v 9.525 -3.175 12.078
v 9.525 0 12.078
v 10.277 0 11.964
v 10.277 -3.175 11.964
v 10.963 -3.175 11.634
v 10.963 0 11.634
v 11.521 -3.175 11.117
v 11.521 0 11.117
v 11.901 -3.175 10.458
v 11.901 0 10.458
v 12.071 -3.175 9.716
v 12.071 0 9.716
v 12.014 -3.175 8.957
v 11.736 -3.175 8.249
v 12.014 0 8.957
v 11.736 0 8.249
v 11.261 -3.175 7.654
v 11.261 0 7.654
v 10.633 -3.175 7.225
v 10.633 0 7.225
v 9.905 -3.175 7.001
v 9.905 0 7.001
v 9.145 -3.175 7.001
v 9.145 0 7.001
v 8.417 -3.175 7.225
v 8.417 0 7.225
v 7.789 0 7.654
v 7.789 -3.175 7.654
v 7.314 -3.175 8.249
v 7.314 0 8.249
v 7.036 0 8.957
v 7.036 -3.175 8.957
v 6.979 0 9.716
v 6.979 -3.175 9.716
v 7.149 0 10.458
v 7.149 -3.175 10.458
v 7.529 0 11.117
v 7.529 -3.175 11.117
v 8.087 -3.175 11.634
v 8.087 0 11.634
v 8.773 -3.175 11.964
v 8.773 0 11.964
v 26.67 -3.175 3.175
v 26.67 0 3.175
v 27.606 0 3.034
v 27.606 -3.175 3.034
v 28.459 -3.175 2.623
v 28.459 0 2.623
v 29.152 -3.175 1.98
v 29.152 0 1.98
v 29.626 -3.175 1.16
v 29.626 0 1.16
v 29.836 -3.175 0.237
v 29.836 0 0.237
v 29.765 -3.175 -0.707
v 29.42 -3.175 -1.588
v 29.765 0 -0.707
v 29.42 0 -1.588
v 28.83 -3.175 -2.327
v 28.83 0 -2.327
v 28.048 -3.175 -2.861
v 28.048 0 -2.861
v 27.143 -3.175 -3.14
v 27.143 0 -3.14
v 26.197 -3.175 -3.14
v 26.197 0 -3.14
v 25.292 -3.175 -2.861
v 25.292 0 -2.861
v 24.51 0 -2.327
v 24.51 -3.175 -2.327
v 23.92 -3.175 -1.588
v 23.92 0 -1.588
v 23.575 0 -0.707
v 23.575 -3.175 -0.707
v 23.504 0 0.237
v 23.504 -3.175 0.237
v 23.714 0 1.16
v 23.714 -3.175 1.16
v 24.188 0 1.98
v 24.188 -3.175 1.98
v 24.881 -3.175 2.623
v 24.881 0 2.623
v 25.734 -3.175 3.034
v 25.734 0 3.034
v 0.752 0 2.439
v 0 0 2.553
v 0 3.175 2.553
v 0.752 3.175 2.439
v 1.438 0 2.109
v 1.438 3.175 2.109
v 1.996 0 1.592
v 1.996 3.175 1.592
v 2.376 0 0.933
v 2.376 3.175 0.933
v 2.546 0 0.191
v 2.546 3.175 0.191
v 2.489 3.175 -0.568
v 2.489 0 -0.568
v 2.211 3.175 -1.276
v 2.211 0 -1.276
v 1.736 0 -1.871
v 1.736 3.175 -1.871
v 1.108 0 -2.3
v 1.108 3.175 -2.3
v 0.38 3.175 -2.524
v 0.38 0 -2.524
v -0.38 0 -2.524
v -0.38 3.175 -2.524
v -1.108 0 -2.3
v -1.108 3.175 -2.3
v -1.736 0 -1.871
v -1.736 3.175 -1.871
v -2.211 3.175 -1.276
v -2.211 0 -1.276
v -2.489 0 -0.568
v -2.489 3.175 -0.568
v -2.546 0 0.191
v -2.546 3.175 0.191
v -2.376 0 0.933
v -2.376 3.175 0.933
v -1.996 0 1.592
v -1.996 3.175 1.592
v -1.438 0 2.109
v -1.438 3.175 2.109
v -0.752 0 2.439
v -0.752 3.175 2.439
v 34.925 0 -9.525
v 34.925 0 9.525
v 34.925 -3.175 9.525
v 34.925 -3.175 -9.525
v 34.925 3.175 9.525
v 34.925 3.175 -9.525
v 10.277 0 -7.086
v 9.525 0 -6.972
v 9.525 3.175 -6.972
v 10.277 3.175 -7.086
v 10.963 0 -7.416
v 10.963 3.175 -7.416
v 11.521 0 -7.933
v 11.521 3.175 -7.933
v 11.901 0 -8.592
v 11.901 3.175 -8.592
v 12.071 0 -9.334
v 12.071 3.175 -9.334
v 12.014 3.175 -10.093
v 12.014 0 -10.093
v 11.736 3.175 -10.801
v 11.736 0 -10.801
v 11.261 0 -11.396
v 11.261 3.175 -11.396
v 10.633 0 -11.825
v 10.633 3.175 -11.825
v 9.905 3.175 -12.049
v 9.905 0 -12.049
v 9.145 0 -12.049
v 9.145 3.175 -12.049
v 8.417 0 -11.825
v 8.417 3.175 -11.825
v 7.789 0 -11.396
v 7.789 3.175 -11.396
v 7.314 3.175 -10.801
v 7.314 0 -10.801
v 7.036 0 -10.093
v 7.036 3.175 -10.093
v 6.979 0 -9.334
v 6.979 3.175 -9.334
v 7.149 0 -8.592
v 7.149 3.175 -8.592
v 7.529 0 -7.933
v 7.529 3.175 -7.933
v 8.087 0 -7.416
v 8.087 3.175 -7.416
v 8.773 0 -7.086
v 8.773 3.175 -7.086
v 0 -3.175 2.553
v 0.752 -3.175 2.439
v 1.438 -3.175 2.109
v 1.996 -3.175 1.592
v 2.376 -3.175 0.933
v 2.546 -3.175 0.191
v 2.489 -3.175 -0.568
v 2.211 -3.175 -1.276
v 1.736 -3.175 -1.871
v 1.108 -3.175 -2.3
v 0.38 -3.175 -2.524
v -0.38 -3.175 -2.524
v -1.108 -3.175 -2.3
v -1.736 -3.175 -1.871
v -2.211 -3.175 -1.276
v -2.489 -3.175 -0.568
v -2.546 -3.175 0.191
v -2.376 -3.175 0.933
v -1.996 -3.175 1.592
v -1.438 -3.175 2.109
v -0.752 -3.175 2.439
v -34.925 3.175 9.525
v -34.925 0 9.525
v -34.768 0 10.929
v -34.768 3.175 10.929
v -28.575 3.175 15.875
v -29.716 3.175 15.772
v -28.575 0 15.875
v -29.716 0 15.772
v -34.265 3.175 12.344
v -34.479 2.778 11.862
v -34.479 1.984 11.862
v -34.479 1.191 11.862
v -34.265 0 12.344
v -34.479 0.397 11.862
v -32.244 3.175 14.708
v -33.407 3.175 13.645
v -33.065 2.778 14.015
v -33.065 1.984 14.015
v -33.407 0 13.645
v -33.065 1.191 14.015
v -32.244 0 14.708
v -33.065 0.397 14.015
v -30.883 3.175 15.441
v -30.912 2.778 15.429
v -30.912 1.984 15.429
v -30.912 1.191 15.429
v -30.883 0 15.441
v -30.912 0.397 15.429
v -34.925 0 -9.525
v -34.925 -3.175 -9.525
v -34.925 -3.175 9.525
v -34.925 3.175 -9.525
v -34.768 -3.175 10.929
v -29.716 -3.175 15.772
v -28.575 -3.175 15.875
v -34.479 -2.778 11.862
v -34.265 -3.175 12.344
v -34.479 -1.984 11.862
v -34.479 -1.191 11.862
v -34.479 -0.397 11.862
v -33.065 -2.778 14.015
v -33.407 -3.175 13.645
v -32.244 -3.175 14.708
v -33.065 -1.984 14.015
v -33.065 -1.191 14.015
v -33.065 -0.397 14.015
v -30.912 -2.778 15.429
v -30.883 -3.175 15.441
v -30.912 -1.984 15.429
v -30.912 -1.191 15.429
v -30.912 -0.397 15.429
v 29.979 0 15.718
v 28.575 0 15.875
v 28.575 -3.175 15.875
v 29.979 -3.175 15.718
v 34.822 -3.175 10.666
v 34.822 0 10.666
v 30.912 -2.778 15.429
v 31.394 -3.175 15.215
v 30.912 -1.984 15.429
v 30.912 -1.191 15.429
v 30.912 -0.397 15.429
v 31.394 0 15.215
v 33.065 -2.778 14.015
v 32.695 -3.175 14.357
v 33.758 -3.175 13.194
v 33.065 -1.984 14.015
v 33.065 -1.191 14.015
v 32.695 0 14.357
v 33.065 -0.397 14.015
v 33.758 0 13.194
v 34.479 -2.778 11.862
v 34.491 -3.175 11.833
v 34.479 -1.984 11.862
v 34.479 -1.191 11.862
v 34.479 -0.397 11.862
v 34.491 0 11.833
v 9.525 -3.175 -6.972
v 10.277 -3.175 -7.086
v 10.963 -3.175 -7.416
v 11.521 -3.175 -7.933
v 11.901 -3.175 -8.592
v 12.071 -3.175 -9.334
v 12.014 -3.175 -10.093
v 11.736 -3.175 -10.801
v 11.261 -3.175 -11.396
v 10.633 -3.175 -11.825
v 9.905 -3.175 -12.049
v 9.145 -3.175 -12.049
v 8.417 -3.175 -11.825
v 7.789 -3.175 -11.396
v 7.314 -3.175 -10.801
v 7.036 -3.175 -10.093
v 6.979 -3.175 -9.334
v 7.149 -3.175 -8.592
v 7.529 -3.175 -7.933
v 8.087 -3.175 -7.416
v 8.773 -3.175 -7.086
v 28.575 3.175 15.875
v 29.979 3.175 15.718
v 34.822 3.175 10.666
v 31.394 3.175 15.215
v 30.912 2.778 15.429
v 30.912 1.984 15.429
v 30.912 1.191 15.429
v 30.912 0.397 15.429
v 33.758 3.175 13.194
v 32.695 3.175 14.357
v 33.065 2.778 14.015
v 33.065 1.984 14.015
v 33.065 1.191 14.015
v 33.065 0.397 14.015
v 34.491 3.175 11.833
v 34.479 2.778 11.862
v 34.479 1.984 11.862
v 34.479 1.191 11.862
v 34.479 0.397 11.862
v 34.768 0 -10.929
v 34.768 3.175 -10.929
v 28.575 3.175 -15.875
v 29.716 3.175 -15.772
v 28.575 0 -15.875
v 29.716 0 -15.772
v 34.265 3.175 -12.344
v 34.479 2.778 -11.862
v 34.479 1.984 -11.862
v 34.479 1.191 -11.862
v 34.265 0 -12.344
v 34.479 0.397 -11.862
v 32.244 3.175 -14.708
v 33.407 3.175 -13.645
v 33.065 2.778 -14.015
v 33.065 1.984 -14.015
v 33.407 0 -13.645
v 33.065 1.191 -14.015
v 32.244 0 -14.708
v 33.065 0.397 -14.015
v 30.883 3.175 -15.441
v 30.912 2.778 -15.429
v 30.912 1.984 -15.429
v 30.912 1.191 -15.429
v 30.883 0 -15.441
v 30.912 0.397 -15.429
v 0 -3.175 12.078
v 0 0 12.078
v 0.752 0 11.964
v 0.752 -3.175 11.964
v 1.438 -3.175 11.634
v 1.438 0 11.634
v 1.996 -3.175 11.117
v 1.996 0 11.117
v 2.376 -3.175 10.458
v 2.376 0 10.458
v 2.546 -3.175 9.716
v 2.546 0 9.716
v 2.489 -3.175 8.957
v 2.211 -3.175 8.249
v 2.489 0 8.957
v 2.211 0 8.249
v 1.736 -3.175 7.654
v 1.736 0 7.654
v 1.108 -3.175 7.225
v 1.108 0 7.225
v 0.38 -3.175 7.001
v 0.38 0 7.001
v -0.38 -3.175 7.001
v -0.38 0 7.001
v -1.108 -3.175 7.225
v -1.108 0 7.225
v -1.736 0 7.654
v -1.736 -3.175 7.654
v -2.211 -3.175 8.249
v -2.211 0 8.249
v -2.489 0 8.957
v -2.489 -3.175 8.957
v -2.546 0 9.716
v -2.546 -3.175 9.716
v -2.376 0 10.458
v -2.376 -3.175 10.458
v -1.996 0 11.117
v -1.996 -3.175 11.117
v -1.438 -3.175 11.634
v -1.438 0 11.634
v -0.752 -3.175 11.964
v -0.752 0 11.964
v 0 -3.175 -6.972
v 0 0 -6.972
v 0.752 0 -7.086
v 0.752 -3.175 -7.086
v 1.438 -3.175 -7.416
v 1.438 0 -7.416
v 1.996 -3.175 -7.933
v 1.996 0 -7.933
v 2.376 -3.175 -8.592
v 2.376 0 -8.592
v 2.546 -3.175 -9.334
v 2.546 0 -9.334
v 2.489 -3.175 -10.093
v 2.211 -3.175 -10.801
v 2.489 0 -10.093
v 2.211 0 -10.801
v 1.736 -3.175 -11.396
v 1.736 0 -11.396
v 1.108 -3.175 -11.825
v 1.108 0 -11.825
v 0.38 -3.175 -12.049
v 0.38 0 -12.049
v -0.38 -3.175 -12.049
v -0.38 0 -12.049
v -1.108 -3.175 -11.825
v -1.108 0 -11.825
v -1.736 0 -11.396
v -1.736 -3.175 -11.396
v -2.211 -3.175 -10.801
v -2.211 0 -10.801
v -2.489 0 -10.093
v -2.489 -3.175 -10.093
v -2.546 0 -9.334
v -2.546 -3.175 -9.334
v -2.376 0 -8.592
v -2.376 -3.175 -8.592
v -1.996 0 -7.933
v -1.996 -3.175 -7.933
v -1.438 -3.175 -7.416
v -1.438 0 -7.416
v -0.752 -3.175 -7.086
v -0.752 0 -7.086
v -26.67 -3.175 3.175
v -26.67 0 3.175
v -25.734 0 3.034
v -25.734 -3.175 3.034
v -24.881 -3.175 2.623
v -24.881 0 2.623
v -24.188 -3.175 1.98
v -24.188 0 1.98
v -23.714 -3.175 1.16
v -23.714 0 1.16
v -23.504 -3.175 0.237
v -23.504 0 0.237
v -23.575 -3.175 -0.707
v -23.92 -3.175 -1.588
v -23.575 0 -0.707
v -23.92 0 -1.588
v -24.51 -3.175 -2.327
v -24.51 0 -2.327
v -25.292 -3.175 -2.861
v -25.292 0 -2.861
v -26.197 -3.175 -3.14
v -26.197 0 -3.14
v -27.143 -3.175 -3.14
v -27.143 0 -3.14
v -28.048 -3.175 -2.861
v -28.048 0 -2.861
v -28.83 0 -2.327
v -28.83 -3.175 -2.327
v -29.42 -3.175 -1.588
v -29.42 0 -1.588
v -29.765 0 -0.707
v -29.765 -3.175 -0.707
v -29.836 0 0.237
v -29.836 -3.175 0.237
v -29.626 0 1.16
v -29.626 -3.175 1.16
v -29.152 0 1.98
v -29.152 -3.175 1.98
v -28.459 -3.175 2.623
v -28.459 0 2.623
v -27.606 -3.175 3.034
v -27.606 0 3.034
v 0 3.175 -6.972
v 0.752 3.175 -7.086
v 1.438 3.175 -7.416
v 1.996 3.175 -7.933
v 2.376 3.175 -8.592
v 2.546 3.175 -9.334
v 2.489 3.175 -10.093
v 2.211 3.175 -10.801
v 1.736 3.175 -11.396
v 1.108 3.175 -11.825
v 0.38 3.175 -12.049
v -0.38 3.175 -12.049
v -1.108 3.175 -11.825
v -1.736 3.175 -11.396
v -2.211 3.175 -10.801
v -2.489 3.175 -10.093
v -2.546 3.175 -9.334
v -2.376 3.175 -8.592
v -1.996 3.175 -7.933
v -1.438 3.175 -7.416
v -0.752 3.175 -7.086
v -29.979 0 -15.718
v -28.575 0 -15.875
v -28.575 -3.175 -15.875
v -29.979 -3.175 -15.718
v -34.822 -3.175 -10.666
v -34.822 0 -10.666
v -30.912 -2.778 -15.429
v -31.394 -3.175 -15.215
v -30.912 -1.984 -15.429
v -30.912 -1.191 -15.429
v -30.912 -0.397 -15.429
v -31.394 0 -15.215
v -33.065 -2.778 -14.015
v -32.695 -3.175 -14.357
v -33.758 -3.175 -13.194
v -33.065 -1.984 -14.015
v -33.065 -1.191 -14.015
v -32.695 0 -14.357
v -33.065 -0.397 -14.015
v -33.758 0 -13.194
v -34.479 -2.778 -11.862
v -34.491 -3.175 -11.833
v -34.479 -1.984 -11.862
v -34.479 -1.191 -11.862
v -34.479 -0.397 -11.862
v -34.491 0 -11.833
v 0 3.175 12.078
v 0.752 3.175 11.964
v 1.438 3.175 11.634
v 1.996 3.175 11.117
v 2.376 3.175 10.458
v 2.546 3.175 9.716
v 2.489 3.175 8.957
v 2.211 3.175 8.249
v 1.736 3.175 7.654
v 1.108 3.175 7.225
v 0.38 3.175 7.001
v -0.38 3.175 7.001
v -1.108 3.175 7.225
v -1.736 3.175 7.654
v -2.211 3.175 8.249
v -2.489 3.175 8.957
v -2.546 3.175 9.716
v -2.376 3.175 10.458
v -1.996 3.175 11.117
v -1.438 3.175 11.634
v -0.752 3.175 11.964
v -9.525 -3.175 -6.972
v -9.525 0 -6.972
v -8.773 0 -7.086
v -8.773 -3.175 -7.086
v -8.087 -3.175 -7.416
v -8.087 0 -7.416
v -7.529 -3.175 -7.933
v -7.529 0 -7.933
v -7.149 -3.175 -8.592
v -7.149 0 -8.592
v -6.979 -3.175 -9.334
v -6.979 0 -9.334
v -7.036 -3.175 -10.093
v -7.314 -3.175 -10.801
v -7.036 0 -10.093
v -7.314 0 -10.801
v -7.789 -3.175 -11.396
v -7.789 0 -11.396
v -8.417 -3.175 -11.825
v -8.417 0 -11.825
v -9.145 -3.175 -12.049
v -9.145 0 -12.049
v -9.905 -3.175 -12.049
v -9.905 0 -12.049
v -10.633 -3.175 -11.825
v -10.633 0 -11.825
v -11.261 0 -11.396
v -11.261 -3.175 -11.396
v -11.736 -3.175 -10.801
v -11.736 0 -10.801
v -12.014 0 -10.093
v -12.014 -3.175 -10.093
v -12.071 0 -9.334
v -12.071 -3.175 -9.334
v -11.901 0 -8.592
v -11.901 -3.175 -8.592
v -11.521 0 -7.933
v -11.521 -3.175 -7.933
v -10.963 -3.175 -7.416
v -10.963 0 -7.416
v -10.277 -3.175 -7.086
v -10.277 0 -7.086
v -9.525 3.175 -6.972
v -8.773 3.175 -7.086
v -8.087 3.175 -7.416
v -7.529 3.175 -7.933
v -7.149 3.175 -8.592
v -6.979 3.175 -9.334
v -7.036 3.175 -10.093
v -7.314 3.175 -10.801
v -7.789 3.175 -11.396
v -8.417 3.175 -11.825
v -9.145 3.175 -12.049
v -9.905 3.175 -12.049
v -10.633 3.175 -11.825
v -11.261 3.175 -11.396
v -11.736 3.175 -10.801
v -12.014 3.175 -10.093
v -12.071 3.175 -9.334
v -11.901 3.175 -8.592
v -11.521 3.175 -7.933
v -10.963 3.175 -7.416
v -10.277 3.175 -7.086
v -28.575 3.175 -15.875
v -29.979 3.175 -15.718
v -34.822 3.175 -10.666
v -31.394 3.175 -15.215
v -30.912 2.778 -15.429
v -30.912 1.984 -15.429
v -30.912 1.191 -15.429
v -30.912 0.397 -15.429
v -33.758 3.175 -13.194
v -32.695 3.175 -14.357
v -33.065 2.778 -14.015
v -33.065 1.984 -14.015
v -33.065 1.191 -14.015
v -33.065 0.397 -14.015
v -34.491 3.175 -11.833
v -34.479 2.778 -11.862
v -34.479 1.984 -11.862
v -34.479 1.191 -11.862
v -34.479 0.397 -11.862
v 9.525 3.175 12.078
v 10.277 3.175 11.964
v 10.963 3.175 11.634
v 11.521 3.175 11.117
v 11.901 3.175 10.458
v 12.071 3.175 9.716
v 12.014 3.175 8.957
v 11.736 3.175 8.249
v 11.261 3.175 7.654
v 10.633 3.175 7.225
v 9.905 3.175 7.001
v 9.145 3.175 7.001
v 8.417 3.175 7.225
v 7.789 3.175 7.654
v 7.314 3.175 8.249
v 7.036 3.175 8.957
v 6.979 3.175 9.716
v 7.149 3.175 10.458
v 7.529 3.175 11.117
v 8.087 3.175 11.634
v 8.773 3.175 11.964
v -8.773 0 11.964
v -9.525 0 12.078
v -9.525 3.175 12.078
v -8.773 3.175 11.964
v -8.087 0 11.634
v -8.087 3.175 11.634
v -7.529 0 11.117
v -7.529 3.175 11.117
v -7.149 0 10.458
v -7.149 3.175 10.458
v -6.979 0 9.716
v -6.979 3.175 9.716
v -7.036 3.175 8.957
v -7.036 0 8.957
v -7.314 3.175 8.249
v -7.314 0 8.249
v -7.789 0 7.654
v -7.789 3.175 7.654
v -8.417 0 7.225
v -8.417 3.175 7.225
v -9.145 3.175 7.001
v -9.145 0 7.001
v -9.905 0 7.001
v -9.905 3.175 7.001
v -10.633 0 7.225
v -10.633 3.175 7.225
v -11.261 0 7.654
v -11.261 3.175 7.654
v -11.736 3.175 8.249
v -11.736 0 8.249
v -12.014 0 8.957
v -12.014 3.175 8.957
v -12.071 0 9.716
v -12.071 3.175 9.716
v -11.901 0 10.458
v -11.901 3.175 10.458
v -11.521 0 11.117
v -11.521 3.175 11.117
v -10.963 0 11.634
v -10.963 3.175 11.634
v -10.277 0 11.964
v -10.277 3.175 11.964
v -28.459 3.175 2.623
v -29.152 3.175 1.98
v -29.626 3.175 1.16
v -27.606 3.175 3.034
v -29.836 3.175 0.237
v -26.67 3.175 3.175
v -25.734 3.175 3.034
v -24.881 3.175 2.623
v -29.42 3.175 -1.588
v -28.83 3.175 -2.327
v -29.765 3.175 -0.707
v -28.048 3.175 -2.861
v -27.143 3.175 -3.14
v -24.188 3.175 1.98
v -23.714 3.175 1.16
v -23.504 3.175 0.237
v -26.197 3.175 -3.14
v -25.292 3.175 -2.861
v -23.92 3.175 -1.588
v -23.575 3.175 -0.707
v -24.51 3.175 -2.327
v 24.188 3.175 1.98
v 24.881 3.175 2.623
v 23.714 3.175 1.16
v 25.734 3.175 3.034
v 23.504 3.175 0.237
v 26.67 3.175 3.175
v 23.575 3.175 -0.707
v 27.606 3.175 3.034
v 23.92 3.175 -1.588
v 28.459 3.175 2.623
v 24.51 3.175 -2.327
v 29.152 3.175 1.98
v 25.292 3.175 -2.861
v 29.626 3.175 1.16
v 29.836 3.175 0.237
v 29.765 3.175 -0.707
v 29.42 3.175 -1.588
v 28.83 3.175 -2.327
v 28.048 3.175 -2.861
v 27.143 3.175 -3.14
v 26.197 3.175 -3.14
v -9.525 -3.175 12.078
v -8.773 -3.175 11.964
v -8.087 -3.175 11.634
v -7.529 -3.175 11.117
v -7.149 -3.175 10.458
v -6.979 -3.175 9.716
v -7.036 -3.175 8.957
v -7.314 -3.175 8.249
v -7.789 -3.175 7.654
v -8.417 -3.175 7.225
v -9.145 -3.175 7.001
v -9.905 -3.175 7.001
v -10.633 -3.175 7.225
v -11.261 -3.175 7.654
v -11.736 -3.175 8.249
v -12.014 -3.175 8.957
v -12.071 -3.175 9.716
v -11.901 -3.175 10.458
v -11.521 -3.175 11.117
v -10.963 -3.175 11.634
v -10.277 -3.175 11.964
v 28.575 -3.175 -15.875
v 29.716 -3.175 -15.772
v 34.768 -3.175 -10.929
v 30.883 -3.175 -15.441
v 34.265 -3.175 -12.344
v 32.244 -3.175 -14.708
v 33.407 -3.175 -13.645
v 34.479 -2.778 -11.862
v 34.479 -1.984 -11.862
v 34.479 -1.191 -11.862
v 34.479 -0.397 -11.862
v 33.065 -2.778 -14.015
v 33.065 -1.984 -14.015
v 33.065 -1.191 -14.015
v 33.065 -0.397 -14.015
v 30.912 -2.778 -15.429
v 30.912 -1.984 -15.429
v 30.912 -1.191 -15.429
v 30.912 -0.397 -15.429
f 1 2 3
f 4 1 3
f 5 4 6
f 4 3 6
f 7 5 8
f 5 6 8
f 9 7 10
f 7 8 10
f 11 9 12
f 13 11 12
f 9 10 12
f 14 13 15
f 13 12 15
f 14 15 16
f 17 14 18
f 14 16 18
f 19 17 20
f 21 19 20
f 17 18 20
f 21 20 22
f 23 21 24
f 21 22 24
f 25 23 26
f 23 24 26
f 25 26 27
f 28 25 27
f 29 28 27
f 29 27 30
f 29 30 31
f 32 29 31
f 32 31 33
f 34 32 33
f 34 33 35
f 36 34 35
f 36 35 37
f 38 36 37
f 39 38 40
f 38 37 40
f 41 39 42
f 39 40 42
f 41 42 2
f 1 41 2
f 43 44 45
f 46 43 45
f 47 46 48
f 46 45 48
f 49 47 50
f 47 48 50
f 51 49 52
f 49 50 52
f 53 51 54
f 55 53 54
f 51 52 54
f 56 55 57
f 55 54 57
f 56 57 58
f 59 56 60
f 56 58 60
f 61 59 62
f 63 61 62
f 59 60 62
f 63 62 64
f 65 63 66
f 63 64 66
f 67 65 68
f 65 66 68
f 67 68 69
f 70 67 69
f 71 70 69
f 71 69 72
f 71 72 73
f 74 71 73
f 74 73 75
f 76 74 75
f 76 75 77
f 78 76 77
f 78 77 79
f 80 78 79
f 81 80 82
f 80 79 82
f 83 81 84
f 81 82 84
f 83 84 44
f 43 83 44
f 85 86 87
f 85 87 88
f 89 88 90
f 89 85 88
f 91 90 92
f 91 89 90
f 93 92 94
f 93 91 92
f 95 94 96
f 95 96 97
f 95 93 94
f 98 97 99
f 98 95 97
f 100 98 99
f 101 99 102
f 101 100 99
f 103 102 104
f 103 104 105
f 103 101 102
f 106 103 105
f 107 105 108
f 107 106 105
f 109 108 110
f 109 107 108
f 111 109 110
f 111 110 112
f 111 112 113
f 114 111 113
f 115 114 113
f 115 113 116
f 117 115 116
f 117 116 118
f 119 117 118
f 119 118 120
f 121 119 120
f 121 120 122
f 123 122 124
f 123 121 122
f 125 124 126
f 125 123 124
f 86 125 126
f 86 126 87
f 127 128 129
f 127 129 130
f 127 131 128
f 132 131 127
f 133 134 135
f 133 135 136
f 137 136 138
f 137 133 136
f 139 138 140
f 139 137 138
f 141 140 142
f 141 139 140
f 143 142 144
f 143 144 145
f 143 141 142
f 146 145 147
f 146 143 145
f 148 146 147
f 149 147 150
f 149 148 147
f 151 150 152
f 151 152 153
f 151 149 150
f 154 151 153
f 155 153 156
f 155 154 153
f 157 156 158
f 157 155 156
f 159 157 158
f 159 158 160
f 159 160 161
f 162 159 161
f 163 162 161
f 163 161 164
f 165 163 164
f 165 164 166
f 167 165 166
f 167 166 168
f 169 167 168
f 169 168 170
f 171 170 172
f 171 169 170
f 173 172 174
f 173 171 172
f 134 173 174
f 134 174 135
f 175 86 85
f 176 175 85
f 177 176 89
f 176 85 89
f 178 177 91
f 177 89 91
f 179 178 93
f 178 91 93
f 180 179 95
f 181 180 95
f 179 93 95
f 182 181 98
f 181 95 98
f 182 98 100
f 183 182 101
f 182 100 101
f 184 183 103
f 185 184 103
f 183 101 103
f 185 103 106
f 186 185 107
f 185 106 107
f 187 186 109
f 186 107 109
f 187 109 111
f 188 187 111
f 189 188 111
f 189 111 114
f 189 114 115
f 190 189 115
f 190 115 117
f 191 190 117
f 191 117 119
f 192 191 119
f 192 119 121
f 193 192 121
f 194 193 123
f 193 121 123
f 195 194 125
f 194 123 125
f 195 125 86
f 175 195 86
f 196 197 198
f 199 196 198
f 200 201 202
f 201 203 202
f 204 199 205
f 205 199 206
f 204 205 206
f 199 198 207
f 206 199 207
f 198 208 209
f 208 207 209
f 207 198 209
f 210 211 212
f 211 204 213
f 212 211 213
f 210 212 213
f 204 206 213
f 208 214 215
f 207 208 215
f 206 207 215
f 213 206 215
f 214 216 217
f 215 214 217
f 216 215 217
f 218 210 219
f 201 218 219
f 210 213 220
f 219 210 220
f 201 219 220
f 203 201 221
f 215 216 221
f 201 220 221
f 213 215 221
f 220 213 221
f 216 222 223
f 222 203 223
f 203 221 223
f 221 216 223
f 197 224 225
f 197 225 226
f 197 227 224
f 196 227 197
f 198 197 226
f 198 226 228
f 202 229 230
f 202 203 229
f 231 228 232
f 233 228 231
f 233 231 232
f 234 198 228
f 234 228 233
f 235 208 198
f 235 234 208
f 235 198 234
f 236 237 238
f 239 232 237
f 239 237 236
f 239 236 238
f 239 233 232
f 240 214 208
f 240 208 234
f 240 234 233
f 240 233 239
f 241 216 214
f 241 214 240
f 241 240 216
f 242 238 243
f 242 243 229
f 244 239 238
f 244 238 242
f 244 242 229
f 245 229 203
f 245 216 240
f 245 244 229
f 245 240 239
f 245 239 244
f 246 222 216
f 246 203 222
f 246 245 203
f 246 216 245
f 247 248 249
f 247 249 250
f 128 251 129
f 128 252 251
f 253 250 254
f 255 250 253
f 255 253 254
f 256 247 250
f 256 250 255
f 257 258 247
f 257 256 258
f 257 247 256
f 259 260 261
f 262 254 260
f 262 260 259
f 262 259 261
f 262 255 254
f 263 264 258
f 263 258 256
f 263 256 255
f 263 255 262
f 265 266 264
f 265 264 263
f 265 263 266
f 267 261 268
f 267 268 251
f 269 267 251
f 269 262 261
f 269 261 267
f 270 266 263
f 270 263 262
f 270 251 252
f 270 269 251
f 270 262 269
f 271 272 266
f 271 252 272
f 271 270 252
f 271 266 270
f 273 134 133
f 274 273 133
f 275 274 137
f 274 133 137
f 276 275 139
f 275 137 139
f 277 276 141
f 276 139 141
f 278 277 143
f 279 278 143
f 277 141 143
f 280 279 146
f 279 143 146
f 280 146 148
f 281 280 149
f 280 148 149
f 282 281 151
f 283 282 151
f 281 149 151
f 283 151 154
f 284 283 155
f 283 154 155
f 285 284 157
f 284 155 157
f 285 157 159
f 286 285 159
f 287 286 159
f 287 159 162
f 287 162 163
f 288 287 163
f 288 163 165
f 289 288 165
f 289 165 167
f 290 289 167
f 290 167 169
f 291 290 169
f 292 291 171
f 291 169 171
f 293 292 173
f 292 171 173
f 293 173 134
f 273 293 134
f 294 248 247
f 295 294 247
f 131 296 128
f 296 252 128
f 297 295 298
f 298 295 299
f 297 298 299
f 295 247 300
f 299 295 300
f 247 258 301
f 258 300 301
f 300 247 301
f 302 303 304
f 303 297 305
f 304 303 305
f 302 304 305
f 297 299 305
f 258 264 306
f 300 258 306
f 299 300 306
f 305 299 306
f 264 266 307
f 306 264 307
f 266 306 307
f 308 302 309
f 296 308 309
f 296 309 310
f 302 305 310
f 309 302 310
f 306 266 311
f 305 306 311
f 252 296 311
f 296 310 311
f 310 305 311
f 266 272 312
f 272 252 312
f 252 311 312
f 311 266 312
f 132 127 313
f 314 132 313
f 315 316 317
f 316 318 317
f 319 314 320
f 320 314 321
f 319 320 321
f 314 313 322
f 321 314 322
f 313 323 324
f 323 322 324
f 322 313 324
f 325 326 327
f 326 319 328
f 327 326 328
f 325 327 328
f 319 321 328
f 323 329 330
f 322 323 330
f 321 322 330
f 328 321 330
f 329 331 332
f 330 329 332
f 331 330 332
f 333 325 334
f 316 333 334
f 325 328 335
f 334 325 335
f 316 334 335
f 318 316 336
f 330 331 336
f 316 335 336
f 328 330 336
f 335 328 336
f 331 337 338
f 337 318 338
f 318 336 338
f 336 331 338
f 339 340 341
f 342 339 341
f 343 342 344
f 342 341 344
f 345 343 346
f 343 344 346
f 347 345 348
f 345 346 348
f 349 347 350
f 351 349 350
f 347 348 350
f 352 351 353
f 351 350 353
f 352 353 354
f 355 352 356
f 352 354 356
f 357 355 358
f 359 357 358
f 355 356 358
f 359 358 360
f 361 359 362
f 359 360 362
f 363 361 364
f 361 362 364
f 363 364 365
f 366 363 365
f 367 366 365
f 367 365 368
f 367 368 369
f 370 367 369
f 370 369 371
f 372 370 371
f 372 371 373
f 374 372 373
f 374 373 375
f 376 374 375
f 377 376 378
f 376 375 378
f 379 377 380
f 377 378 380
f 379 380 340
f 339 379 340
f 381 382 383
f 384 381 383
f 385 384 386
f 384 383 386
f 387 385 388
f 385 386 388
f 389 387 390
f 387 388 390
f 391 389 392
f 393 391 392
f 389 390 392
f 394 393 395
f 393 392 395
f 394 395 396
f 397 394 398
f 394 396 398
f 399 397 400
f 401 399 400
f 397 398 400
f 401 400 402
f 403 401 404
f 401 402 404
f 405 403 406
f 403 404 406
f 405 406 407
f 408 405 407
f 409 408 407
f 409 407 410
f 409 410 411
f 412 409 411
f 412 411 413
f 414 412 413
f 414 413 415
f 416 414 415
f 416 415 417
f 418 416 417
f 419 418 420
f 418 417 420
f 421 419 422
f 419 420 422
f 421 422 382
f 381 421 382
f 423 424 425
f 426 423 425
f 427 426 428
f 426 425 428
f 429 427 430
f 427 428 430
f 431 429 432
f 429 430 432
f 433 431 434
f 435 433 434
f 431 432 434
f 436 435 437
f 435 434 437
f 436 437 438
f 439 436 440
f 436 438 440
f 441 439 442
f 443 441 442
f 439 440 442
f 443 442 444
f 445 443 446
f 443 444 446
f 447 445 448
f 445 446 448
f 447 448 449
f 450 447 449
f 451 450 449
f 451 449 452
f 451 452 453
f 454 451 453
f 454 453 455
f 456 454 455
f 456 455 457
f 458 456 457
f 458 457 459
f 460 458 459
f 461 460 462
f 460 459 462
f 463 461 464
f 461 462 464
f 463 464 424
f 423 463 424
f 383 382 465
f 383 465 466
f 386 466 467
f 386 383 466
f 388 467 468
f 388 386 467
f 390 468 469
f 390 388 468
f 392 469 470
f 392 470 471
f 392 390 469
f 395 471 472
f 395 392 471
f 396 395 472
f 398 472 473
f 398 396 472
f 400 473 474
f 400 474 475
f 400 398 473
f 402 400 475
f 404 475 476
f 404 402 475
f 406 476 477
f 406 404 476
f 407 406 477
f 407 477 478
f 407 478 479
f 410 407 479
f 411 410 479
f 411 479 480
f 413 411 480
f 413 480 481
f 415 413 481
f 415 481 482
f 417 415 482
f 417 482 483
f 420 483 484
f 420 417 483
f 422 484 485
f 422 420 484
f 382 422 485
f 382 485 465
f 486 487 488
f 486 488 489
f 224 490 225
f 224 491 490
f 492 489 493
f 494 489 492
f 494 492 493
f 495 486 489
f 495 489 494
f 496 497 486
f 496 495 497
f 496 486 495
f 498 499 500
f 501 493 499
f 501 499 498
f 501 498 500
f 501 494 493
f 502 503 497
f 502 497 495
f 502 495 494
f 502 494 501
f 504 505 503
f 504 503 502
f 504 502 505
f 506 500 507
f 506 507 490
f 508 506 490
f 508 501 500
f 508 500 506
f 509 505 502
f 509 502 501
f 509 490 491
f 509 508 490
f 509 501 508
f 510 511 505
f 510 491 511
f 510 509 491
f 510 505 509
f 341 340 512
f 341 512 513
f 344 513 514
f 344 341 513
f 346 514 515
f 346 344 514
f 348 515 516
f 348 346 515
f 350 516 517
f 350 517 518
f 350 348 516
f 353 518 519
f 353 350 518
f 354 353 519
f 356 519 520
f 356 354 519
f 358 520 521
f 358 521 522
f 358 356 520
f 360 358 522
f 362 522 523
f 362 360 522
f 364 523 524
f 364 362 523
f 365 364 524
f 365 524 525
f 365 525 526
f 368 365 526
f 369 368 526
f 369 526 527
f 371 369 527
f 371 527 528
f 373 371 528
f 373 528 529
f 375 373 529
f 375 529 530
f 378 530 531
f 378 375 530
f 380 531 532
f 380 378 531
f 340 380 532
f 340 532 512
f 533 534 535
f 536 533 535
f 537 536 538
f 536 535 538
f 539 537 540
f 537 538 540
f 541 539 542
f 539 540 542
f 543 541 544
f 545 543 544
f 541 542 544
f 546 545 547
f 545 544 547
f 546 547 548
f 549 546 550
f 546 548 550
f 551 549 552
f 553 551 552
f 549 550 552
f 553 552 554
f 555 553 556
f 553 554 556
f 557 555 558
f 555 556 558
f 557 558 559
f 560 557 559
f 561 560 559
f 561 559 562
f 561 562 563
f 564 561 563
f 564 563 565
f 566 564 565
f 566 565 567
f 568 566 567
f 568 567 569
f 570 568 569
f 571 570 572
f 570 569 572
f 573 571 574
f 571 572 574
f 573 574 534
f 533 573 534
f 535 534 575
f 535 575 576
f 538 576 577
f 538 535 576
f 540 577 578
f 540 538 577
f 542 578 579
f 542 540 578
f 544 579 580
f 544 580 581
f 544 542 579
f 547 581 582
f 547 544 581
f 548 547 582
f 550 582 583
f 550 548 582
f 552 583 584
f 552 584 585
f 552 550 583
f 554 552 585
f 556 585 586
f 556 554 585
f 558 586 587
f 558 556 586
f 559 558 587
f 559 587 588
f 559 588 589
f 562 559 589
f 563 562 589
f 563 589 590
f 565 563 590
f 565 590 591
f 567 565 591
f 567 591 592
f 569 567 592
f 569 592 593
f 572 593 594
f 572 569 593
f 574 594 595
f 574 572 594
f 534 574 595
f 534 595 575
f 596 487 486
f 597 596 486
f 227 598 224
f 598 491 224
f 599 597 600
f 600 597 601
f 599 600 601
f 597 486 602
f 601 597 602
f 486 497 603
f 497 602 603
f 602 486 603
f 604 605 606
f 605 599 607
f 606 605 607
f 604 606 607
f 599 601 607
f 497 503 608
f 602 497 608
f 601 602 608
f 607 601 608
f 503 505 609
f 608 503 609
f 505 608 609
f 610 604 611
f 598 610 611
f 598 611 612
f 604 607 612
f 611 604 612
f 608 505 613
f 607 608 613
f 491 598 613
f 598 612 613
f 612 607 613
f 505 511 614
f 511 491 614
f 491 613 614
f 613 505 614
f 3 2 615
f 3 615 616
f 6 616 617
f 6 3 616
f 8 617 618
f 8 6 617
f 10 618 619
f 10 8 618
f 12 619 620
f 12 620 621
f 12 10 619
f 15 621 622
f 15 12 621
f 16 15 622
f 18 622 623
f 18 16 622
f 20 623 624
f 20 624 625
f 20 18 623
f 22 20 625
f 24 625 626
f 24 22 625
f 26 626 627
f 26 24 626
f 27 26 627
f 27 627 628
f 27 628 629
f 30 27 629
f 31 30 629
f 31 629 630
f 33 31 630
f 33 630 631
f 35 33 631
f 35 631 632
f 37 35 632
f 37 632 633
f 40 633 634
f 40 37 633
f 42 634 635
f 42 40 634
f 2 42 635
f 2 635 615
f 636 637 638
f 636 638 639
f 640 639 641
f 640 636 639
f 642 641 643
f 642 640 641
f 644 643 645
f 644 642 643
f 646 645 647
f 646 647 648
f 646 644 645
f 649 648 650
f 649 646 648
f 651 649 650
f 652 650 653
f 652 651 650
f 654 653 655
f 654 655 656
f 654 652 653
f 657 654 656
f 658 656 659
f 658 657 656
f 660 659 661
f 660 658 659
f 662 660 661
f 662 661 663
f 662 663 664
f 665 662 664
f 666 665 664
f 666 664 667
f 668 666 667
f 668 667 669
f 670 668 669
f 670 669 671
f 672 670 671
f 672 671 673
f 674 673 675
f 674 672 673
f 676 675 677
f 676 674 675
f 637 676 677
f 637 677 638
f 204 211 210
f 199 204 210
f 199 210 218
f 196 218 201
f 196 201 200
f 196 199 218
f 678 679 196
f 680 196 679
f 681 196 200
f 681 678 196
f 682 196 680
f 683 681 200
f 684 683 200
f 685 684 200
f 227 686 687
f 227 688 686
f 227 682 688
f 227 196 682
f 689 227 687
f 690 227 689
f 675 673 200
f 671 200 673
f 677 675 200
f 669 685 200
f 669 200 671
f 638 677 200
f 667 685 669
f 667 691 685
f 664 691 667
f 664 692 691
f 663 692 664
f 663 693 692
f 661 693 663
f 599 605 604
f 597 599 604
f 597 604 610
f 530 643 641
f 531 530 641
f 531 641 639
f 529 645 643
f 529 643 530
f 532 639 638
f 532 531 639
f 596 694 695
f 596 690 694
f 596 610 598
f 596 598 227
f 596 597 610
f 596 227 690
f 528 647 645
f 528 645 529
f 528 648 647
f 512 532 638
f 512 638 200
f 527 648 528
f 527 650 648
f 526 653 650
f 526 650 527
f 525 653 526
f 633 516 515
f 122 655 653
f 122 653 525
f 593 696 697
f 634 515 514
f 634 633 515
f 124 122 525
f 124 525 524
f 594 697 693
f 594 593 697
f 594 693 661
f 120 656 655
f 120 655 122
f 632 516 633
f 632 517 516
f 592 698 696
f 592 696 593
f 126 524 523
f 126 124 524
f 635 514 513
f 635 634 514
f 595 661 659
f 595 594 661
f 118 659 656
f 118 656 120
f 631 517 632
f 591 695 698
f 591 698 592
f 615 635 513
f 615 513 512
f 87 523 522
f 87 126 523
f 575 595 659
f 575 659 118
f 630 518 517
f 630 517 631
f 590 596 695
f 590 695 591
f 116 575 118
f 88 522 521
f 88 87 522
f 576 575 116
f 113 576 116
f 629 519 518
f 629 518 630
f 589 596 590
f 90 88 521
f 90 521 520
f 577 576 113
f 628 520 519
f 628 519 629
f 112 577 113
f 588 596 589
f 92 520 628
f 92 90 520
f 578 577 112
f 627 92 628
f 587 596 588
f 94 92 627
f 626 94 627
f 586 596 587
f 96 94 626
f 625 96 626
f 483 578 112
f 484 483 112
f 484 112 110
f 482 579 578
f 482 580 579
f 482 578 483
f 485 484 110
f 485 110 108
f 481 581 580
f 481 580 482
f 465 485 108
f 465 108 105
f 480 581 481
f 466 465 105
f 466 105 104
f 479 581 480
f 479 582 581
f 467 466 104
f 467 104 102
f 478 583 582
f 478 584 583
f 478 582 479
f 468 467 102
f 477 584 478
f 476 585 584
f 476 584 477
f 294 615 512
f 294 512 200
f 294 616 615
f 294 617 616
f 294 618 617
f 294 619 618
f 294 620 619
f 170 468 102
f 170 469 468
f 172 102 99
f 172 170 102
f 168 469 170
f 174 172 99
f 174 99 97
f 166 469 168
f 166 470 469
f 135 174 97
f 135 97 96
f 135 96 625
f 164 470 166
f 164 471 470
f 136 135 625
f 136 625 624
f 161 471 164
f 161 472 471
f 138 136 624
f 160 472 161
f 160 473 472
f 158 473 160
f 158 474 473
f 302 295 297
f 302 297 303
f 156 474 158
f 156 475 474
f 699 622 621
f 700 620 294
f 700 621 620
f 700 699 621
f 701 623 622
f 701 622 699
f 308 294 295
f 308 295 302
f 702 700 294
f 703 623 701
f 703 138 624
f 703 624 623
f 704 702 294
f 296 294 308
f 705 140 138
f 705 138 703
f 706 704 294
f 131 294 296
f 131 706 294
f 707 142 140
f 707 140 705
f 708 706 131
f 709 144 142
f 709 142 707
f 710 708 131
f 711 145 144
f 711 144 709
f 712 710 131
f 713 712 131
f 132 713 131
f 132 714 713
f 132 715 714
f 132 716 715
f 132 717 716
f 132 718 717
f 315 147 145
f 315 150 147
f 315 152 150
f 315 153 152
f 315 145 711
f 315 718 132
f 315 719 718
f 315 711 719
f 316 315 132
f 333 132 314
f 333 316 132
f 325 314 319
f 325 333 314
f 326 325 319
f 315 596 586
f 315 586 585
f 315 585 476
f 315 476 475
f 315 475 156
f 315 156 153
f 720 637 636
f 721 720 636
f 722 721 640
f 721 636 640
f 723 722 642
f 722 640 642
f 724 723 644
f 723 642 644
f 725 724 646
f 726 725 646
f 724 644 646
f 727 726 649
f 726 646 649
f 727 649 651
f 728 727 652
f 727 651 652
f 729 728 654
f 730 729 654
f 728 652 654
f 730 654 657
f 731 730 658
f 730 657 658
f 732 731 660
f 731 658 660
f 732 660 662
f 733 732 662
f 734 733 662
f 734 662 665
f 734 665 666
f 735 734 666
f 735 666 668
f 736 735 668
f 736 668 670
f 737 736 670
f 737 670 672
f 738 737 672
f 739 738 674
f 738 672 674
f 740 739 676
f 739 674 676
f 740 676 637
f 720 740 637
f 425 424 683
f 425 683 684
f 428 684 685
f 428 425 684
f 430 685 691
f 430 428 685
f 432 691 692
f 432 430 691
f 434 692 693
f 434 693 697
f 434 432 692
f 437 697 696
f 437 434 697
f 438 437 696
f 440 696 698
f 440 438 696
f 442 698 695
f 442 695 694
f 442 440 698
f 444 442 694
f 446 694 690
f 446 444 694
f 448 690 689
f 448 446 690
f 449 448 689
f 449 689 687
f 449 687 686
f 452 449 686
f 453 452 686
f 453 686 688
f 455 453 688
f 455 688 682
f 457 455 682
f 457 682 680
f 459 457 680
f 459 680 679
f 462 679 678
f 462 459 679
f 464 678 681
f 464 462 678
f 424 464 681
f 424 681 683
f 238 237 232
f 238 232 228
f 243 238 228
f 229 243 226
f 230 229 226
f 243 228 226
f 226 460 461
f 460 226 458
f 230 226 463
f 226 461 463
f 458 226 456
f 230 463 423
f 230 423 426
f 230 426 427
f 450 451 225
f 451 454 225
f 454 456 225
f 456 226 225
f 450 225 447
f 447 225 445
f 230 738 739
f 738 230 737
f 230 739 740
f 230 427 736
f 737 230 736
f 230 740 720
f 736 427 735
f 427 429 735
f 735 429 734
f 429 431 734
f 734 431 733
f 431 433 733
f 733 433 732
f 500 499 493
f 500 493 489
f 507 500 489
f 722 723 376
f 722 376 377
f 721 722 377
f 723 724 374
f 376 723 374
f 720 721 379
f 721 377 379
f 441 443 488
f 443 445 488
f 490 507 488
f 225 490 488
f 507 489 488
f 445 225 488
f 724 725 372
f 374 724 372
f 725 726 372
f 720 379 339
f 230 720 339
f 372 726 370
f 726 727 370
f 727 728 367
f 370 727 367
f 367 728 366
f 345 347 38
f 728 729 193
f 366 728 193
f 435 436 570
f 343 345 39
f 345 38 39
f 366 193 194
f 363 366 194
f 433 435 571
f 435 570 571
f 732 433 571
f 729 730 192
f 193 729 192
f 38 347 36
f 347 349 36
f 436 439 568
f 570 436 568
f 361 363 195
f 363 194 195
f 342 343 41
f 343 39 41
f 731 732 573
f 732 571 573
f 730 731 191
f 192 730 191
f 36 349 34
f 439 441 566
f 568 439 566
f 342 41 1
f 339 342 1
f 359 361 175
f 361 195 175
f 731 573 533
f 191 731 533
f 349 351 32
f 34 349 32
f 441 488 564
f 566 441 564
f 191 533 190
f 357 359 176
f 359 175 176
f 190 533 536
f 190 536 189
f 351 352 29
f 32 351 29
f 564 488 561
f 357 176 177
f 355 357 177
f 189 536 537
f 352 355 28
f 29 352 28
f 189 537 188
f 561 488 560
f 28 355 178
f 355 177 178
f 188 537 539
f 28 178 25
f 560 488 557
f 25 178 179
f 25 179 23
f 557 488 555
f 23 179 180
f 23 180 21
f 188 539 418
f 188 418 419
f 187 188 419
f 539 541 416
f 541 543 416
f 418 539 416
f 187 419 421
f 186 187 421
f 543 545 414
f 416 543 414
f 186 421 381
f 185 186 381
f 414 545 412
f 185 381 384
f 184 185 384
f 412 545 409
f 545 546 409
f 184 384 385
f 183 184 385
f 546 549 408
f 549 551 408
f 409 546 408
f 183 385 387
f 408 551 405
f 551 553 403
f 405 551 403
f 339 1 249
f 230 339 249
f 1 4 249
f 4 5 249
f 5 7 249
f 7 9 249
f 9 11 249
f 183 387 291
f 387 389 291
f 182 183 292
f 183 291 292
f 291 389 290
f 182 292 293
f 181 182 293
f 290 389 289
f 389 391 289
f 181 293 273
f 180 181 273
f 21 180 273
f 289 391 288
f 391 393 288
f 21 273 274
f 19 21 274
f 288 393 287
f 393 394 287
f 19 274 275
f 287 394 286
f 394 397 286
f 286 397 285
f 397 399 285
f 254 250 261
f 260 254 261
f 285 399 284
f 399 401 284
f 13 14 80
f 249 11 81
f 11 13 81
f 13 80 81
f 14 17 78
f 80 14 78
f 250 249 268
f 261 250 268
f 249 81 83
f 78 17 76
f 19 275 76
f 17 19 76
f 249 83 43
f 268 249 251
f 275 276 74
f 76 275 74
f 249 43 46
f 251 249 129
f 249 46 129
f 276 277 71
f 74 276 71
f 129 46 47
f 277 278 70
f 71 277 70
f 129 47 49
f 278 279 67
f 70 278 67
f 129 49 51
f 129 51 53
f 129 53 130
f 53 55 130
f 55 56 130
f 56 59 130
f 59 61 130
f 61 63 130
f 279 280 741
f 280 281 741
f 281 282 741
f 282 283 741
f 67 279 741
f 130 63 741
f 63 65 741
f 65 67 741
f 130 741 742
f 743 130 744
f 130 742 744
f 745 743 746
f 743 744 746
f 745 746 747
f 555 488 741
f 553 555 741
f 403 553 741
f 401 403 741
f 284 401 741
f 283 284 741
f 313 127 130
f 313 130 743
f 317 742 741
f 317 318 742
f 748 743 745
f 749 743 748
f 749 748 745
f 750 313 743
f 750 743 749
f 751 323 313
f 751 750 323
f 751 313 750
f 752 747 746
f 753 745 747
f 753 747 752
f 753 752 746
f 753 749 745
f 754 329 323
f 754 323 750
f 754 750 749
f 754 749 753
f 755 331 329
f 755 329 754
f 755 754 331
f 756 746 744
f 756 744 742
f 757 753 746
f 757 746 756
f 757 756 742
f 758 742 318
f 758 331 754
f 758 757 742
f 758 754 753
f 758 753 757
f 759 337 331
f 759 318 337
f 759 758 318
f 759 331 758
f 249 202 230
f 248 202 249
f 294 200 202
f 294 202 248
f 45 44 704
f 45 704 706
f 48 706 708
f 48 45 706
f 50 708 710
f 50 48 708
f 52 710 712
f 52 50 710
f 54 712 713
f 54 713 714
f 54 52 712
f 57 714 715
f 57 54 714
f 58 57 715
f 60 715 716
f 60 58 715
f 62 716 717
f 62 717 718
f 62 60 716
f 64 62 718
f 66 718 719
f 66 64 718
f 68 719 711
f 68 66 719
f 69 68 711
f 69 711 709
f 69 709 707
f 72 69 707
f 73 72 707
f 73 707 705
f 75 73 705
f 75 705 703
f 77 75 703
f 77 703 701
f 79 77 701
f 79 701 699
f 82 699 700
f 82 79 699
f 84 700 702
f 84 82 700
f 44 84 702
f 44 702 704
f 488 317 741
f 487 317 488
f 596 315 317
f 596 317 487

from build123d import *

# Parameters (mm, degrees)
SKETCH1_R           = 2.552698787
SKETCH1_R_2         = 2.5527
SKETCH1_R_3         = 3.175
BOSS_EXTRUDE2_DEPTH = 3.175


with BuildPart() as part:
    # Sketch1 → Boss-Extrude2 (new, symmetric)
    with BuildSketch(Plane(origin=(0, 0, 0), x_dir=(1, 0, 0), z_dir=(0, 1, 0))):
        with BuildLine():
            Line((-28.575, -15.875), (28.575, -15.875))
            add(Edge.make_bspline(
                [(28.575, -15.875), (29.157862345, -15.875), (29.730465383, -15.768989089), (30.338469644, -15.656424047), (30.912401406, -15.429155712), (31.511428211, -15.191950117), (32.049781934, -14.839921496), (32.600578196, -14.479756719), (33.065128061, -14.015128061), (33.530435301, -13.549741898), (33.889921496, -12.999781934), (34.242433686, -12.460491153), (34.479155712, -11.862401406), (34.706715402, -11.287460745), (34.818989089, -10.680465383), (34.925, -10.107329034), (34.925, -9.525)],
                knots=[0, 0, 0, 0.125, 0.125, 0.25, 0.25, 0.375, 0.375, 0.5, 0.5, 0.625, 0.625, 0.75, 0.75, 0.875, 0.875, 1, 1, 1], degree=2))
            Line((34.925, -9.525), (34.925, 9.525))
            add(Edge.make_bspline(
                [(34.925, 9.525), (34.925, 10.107862345), (34.818989089, 10.680465383), (34.706424047, 11.288469644), (34.479155712, 11.862401406), (34.241950117, 12.461428211), (33.889921496, 12.999781934), (33.529756719, 13.550578196), (33.065128061, 14.015128061), (32.599741898, 14.480435301), (32.049781934, 14.839921496), (31.510491153, 15.192433686), (30.912401406, 15.429155712), (30.337460745, 15.656715402), (29.730465383, 15.768989089), (29.157329034, 15.875), (28.575, 15.875)],
                knots=[0, 0, 0, 0.125, 0.125, 0.25, 0.25, 0.375, 0.375, 0.5, 0.5, 0.625, 0.625, 0.75, 0.75, 0.875, 0.875, 1, 1, 1], degree=2))
            Line((28.575, 15.875), (-28.575, 15.875))
            add(Edge.make_bspline(
                [(-28.575, 15.875), (-29.157862345, 15.875), (-29.730465383, 15.768989089), (-30.338469644, 15.656424047), (-30.912401406, 15.429155712), (-31.511428211, 15.191950117), (-32.049781934, 14.839921496), (-32.600578196, 14.479756719), (-33.065128061, 14.015128061), (-33.530435301, 13.549741898), (-33.889921496, 12.999781934), (-34.242433686, 12.460491153), (-34.479155712, 11.862401406), (-34.706715402, 11.287460745), (-34.818989089, 10.680465383), (-34.925, 10.107329034), (-34.925, 9.525)],
                knots=[0, 0, 0, 0.125, 0.125, 0.25, 0.25, 0.375, 0.375, 0.5, 0.5, 0.625, 0.625, 0.75, 0.75, 0.875, 0.875, 1, 1, 1], degree=2))
            Line((-34.925, 9.525), (-34.925, -9.525))
            add(Edge.make_bspline(
                [(-34.925, -9.525), (-34.925, -10.107862345), (-34.818989089, -10.680465383), (-34.706424047, -11.288469644), (-34.479155712, -11.862401406), (-34.241950117, -12.461428211), (-33.889921496, -12.999781934), (-33.529756719, -13.550578196), (-33.065128061, -14.015128061), (-32.599741898, -14.4804353), (-32.049781934, -14.839921496), (-31.510491153, -15.192433686), (-30.912401406, -15.429155712), (-30.337460745, -15.656715402), (-29.730465383, -15.768989089), (-29.157329034, -15.875), (-28.575, -15.875)],
                knots=[0, 0, 0, 0.125, 0.125, 0.25, 0.25, 0.375, 0.375, 0.5, 0.5, 0.625, 0.625, 0.75, 0.75, 0.875, 0.875, 1, 1, 1], degree=2))
        make_face()
        with Locations(Location((-9.525, -9.525, 0), (0, 0, 270))):
            Circle(SKETCH1_R, mode=Mode.SUBTRACT)
        with Locations(Location((-9.525, 9.525, 0), (0, 0, 270))):
            Circle(SKETCH1_R_2, mode=Mode.SUBTRACT)
        with Locations(Location((-26.67, 0, 0), (0, 0, 270))):
            Circle(SKETCH1_R_3, mode=Mode.SUBTRACT)
        with Locations(Location((0, -9.525, 0), (0, 0, 270))):
            Circle(SKETCH1_R_2, mode=Mode.SUBTRACT)
        with Locations(Location((9.525, -9.525, 0), (0, 0, 270))):
            Circle(SKETCH1_R_2, mode=Mode.SUBTRACT)
        with Locations(Location((26.67, 0, 0), (0, 0, 270))):
            Circle(SKETCH1_R_3, mode=Mode.SUBTRACT)
        with Locations(Location((9.525, 9.525, 0), (0, 0, 270))):
            Circle(SKETCH1_R_2, mode=Mode.SUBTRACT)
        with Locations(Location((0, 9.525, 0), (0, 0, 270))):
            Circle(SKETCH1_R_2, mode=Mode.SUBTRACT)
        with Locations(Location((0, 0, 0), (0, 0, 270))):
            Circle(SKETCH1_R_2, mode=Mode.SUBTRACT)
    extrude(amount=BOSS_EXTRUDE2_DEPTH, both=True)


solid = part.part
